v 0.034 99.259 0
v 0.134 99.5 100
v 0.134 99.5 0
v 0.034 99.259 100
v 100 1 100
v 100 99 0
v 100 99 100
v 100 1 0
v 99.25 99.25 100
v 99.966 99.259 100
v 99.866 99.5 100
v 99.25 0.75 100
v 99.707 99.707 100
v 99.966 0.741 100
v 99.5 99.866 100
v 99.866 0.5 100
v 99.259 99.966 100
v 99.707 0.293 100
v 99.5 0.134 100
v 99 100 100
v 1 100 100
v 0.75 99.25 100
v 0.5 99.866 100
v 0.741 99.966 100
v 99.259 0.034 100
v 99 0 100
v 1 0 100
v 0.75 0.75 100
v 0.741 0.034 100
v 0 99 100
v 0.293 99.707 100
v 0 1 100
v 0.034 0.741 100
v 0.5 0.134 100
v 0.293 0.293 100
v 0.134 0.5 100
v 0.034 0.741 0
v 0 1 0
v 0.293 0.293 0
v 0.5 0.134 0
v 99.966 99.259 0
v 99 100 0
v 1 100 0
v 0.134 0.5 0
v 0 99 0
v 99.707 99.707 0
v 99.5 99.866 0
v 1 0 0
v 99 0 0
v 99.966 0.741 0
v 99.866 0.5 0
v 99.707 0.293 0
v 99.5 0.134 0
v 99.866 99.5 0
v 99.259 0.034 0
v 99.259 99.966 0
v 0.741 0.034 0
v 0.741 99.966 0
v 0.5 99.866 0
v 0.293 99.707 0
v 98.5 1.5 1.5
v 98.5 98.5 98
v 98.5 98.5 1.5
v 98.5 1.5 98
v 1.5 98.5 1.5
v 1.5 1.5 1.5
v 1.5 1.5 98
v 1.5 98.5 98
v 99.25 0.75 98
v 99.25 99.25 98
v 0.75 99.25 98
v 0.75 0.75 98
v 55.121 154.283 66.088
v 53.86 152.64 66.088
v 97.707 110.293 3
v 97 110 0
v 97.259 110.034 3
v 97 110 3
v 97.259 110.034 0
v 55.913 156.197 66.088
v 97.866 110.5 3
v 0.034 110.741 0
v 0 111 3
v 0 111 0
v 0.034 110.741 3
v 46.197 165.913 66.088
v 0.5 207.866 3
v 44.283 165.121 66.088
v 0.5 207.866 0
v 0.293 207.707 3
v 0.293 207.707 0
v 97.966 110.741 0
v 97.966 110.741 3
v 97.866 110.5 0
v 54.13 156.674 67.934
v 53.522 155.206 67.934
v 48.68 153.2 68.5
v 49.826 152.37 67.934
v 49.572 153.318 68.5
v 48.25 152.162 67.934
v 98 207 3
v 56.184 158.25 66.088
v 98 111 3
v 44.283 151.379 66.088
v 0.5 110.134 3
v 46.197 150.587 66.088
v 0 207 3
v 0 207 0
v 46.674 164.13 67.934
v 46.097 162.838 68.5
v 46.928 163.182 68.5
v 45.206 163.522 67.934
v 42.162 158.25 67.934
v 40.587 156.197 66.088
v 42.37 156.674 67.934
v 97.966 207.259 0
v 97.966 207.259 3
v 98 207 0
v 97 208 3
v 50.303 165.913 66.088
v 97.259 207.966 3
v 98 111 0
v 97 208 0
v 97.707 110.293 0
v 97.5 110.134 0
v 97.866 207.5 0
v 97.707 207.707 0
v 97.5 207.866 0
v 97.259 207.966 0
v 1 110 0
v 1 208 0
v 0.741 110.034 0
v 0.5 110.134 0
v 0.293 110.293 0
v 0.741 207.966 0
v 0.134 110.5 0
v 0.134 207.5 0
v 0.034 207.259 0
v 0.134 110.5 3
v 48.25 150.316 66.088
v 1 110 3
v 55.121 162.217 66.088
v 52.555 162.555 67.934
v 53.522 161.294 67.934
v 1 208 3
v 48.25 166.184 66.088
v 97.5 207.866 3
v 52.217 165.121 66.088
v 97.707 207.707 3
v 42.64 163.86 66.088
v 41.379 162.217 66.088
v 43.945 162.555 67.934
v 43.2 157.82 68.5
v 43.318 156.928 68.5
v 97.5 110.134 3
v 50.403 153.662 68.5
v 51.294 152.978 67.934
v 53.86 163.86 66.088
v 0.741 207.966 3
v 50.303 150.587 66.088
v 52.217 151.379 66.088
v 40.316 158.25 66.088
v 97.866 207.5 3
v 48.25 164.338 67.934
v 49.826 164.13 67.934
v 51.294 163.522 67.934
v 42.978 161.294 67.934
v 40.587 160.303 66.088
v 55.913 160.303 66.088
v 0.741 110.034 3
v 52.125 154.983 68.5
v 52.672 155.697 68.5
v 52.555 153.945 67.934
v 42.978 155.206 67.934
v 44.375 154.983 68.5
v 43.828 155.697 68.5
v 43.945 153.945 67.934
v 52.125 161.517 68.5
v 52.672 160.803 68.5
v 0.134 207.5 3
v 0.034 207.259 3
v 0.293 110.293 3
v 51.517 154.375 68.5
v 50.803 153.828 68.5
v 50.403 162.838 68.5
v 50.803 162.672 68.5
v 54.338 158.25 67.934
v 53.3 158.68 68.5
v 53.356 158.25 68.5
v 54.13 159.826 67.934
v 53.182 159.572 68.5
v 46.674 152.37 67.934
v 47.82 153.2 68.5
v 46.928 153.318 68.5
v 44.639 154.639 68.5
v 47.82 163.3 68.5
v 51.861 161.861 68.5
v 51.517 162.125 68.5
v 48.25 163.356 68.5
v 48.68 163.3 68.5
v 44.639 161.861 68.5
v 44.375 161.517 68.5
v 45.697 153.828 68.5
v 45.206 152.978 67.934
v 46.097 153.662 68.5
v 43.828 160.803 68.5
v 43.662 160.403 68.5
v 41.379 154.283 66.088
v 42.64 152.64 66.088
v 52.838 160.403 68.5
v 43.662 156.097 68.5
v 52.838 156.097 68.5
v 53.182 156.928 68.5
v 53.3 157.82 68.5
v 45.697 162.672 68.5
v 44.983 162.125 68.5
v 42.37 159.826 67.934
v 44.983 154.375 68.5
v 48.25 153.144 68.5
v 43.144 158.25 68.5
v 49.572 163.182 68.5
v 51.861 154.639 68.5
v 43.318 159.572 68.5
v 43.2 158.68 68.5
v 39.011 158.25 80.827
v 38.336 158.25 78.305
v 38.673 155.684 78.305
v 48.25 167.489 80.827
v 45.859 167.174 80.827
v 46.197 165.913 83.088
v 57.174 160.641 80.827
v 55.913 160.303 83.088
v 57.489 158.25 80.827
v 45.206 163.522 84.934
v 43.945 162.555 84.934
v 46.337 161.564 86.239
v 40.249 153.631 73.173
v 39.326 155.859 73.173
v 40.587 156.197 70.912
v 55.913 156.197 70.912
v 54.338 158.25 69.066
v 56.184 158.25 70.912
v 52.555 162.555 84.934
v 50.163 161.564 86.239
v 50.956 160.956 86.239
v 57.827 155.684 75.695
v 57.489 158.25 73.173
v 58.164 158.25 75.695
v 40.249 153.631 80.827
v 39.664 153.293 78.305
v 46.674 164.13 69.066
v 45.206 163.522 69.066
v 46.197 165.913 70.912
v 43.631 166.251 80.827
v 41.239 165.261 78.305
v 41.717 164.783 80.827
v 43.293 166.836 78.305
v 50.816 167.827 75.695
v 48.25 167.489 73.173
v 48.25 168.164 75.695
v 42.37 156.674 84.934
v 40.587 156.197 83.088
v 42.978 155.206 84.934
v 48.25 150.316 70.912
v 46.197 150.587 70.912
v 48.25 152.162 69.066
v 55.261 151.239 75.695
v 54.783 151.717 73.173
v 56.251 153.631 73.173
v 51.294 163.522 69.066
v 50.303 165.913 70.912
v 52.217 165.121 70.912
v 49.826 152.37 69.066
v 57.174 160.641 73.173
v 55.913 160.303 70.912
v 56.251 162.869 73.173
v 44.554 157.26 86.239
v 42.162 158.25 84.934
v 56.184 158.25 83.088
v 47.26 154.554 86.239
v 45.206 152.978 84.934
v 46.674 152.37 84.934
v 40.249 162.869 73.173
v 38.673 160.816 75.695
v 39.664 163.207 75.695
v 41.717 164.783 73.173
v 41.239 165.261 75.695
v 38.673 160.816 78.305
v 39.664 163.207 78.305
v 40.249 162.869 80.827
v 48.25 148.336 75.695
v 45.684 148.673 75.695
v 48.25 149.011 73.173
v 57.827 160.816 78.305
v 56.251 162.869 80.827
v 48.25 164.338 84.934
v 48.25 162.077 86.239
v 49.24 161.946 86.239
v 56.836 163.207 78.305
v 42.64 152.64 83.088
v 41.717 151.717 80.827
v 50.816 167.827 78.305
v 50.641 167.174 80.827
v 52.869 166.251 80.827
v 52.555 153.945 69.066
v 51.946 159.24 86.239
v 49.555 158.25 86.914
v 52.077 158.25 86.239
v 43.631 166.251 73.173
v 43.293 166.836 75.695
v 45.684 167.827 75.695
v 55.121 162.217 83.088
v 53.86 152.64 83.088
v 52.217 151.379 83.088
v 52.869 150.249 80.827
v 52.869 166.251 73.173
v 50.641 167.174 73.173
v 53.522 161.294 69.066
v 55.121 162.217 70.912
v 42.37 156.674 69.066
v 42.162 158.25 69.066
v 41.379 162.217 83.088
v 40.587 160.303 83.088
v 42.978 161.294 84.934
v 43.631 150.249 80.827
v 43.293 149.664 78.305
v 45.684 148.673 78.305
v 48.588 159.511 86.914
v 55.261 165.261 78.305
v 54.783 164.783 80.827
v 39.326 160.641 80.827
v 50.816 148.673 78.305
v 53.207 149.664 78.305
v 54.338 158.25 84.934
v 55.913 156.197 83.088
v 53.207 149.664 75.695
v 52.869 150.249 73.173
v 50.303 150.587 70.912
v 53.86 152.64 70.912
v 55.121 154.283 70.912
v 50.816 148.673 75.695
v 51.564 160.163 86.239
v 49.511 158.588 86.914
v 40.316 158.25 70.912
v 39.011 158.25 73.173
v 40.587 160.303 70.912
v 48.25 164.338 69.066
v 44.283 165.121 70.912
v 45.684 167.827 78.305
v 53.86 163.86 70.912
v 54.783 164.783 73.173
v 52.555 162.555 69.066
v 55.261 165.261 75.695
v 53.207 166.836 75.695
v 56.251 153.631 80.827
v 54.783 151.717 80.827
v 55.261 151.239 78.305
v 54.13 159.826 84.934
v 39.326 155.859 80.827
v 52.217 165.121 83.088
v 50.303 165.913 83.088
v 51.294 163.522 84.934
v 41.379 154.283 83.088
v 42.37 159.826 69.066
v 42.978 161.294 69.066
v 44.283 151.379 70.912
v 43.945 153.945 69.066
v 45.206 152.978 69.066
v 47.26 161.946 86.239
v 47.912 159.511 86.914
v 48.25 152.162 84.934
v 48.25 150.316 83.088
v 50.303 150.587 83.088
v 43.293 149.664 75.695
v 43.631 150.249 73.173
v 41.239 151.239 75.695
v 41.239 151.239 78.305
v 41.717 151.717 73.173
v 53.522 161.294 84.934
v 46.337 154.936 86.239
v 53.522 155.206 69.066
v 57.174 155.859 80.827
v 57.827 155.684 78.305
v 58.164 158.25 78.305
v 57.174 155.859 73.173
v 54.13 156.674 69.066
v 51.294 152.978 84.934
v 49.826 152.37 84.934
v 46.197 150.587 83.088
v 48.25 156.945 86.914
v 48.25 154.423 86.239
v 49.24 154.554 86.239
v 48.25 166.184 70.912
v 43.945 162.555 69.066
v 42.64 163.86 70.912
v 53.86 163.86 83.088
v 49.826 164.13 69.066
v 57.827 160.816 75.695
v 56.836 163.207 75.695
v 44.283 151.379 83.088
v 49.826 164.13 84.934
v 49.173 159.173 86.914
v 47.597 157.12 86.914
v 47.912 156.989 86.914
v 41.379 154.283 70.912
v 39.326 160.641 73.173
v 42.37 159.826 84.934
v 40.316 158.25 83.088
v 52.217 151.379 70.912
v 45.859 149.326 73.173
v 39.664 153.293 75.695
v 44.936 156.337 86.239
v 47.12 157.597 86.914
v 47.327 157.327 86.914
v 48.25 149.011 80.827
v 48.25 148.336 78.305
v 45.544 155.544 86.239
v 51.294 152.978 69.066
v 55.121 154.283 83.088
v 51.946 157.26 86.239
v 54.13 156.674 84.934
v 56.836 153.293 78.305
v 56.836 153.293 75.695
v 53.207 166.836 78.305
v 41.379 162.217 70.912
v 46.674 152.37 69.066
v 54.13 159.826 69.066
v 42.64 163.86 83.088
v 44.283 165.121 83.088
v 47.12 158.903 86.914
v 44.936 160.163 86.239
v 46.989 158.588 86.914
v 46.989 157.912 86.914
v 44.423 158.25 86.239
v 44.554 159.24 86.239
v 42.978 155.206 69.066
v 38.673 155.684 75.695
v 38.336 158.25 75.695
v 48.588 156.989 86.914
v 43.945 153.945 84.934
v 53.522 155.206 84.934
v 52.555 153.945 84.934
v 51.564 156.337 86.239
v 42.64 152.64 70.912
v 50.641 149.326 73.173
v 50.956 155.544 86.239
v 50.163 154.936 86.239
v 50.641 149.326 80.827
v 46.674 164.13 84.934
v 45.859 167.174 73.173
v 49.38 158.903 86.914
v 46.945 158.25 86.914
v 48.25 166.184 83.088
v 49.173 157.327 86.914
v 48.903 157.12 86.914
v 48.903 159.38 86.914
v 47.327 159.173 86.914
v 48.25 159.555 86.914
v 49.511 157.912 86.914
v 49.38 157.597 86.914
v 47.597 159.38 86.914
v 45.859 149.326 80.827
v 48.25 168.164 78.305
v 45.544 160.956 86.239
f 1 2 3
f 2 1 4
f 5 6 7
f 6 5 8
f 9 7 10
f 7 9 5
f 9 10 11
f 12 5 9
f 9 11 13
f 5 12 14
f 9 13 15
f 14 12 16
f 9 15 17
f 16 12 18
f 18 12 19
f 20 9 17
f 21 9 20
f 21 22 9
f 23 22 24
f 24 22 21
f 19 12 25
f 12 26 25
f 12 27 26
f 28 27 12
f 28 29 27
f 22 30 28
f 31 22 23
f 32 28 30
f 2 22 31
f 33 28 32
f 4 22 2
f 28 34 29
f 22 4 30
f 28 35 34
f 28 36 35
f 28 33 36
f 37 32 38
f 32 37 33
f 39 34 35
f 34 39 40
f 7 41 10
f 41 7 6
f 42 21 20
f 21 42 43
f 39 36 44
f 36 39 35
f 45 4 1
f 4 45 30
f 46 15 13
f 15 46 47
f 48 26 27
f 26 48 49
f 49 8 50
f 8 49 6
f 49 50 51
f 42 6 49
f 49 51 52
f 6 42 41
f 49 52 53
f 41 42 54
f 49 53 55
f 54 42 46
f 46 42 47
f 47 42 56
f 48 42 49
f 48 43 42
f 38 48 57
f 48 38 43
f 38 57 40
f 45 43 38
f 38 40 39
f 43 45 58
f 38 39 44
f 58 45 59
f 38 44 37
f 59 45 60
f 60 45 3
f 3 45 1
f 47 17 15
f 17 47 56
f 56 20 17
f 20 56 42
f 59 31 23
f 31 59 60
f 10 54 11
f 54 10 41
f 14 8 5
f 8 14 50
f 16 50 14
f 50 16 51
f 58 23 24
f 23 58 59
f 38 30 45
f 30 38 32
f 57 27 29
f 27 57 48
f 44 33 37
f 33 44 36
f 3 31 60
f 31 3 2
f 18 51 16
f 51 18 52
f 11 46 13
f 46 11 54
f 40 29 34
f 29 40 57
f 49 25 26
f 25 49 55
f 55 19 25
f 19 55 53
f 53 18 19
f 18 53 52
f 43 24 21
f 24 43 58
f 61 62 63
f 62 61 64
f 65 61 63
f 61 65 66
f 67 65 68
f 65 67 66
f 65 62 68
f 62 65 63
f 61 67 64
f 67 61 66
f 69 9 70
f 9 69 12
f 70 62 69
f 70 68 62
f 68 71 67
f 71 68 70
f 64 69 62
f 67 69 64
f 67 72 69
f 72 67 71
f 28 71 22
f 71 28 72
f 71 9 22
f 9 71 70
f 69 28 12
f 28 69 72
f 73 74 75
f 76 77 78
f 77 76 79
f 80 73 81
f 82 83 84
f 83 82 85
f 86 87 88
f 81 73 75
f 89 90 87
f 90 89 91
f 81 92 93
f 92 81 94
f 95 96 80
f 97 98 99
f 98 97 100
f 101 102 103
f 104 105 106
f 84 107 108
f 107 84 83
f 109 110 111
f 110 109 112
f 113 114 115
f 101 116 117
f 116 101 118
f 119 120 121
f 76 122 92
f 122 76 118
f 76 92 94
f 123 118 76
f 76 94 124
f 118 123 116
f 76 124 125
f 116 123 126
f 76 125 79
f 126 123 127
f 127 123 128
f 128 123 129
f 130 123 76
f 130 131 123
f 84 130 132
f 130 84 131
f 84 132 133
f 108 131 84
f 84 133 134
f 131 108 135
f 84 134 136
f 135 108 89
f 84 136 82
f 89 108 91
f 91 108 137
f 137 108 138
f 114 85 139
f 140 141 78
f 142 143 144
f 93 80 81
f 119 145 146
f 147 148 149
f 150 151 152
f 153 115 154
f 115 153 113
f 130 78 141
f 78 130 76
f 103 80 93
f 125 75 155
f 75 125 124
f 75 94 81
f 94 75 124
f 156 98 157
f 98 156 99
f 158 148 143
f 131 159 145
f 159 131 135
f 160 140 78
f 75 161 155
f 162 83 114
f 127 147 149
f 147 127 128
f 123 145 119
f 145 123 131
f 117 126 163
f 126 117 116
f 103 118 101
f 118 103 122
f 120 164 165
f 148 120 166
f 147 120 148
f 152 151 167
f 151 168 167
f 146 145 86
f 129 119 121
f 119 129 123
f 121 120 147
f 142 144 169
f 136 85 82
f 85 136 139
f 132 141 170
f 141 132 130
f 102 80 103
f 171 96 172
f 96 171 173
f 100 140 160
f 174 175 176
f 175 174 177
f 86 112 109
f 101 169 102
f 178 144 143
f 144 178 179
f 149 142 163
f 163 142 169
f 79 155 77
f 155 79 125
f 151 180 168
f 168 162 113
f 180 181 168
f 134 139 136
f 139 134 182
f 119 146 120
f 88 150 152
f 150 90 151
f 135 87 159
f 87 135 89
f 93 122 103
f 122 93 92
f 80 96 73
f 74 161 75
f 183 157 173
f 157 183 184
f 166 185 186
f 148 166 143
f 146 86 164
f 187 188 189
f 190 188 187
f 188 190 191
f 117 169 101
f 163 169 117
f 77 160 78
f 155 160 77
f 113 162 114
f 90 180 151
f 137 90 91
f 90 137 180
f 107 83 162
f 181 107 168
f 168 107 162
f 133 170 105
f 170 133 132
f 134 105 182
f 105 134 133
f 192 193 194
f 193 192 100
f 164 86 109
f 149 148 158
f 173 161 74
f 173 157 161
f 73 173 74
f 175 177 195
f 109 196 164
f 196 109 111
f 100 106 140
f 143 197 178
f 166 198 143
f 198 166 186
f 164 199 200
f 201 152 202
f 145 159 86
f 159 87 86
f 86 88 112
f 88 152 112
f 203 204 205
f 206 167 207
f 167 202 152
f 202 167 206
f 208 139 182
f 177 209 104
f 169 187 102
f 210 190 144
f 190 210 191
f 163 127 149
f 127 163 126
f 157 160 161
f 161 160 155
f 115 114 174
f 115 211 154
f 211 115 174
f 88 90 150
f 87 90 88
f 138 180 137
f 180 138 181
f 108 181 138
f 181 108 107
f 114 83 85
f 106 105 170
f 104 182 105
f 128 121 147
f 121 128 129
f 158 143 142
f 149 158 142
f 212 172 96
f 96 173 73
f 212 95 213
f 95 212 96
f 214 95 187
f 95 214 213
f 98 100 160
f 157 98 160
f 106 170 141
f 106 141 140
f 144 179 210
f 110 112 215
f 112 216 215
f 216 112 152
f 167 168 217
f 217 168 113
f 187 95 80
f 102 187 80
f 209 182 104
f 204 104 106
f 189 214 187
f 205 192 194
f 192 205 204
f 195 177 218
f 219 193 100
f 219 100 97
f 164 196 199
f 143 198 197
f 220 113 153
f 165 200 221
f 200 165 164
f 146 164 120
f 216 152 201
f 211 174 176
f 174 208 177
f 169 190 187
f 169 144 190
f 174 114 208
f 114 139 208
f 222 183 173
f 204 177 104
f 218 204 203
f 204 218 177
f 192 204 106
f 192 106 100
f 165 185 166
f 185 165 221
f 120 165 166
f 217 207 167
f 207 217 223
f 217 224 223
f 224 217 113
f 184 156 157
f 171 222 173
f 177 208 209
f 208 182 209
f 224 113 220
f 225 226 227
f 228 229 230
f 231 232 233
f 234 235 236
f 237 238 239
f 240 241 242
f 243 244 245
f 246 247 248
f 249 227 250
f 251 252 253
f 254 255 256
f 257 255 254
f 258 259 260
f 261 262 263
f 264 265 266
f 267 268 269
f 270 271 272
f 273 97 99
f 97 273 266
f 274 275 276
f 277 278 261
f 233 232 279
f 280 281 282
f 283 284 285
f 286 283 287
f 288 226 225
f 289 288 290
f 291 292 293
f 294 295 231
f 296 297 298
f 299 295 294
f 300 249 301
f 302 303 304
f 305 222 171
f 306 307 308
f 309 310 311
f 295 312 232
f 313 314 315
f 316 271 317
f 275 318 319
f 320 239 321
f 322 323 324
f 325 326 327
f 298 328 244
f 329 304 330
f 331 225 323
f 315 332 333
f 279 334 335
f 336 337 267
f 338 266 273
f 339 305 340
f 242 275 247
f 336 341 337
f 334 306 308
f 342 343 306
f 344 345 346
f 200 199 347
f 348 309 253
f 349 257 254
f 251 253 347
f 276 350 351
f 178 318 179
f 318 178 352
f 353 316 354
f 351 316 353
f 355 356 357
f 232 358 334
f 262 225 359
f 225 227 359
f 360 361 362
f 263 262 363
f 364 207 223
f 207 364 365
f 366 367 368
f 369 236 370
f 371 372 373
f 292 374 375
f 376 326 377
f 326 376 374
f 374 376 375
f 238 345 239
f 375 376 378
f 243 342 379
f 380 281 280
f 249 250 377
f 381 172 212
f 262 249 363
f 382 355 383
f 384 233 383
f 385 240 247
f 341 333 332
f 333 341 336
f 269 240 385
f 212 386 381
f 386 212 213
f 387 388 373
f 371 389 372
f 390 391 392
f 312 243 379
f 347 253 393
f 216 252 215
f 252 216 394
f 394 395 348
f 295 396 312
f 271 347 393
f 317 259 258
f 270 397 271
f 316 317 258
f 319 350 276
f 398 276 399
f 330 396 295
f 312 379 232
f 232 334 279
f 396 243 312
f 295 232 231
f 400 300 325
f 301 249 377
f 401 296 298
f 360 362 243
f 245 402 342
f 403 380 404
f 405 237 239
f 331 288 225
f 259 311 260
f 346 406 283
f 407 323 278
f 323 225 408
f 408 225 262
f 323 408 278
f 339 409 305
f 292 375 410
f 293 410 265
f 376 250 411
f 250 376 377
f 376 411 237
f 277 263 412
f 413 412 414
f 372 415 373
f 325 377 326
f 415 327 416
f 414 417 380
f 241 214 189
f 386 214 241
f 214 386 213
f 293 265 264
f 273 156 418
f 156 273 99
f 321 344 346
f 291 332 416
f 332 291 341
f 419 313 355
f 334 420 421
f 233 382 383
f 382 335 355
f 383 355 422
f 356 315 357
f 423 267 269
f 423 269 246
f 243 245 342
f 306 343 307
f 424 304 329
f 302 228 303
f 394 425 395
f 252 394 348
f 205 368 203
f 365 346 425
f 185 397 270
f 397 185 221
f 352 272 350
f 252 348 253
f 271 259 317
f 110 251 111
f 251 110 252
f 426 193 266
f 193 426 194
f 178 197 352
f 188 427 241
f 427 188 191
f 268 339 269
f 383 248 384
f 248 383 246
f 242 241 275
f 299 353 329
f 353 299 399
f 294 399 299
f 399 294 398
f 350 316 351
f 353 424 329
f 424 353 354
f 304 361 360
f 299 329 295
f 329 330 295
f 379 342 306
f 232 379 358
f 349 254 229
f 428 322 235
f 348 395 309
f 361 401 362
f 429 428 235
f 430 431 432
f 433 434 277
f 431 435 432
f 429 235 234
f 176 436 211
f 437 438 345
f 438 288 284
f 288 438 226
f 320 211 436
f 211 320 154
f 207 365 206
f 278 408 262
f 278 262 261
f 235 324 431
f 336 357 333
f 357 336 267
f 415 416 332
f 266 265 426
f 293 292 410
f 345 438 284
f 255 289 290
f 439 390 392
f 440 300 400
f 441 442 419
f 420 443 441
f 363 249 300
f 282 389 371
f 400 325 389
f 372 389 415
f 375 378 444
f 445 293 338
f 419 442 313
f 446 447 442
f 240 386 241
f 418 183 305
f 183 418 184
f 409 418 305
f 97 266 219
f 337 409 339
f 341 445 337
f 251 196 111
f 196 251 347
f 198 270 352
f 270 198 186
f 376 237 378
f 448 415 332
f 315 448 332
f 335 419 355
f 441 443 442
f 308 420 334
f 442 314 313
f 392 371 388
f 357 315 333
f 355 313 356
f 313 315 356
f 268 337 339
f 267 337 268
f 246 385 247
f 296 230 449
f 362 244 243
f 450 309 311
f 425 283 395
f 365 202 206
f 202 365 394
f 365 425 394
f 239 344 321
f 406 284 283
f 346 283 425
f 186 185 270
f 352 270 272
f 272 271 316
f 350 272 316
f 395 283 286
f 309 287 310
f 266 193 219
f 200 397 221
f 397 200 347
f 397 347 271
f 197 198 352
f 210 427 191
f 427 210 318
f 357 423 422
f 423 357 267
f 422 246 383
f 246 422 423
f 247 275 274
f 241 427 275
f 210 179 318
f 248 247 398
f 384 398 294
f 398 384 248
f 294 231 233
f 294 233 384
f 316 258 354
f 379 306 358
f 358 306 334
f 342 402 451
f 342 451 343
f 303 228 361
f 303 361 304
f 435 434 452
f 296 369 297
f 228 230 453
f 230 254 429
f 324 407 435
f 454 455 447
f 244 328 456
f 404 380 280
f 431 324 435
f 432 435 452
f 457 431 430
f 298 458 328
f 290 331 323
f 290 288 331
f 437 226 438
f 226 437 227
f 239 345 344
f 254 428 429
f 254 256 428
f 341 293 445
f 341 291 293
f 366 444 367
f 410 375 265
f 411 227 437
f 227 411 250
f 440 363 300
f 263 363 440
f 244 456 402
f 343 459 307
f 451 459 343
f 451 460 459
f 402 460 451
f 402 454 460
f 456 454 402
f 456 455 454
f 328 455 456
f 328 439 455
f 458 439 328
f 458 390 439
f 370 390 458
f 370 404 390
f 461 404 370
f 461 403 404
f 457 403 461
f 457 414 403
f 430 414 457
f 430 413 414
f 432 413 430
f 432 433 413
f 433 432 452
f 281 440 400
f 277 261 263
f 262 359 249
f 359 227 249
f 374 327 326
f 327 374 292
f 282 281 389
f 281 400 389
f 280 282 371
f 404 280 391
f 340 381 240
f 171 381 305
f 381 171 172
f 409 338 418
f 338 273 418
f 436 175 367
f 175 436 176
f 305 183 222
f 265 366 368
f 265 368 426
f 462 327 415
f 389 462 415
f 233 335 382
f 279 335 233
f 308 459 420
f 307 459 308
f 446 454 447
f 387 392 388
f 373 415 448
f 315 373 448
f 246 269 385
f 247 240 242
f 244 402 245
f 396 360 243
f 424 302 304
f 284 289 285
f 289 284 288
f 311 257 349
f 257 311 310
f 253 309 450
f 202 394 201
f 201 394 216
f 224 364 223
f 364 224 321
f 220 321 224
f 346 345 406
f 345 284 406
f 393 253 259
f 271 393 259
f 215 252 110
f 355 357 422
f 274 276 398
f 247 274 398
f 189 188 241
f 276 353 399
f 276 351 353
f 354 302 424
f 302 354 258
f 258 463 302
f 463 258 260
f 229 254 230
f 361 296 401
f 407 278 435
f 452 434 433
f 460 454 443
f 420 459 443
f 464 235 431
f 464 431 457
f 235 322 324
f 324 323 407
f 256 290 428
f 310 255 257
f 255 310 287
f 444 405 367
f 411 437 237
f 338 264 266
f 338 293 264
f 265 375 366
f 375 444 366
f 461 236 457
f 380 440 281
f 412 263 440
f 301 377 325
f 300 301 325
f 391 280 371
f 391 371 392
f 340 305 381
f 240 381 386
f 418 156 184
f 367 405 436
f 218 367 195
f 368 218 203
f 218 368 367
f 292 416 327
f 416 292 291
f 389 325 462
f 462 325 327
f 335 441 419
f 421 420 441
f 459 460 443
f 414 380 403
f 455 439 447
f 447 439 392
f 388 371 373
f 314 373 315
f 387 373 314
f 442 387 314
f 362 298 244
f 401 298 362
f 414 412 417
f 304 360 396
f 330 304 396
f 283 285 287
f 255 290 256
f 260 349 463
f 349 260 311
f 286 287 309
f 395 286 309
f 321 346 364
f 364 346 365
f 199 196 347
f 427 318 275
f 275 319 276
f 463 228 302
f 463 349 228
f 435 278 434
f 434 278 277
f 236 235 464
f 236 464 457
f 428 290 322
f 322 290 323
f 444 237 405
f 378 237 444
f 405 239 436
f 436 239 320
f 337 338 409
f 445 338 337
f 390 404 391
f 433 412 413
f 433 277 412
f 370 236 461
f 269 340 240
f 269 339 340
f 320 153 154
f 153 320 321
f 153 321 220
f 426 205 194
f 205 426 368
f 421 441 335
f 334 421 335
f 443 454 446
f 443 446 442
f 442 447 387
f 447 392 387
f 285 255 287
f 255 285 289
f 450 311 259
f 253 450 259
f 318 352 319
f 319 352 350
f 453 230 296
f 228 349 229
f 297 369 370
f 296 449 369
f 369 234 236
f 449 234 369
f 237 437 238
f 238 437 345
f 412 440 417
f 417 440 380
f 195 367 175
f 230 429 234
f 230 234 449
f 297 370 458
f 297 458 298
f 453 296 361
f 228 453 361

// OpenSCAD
figure = "sphere";      //[sphere,cube,pyramide,triangles,pyramide2,diamond,pyramide3]
//Secret compartment
Secret = "false";   //[true,false]
//Cover
Cover = "true";     //[true,false]
//Box length
long_boit = 100;
//Box width
larg_boit = 100;
//Box height
haut_boit = 100;




module toto() {
}

$fn = 24;


haut_bo_s = haut_boit/2;
ray_sph = long_boit/10;
ray1_cyl = larg_boit/5.5;
ray2_cyl = 0;
haut_cyl = haut_boit/3;
cote_cub = long_boit/6;
ray_cyl_t = ray_sph;
haut_cyl_t = ray_cyl_t;
haut_t = ray_sph*2;
cot_tr = cote_cub*1.5;


teta = 2;
ep_bort = 1.5;
ep_bort_s = 2.25;
ep_fond = 1.5;
sec_haut = 5;
sec = 2;
haut_couv_av_hul = 2;   //hauteur du couvercle avant que l'on fasse le hull
haut_bord = haut_couv_av_hul;
long_boit_int = long_boit - ep_bort*teta;
larg_boit_int = larg_boit - ep_bort*teta;
haut_boit_int = haut_boit - ep_fond;
haut_couv = haut_boit/teta;
ray_cyl_mink = 1;
haut_cyl_mink = 1;
tolerance=0.5;


boite();
if(Secret == "false") {
    translate([0,larg_boit+10,0])
    if(Cover == "true") {
        couvercle();
    }
}
if(Secret == "true") {
    if(Cover == "true") {
        translate([0,larg_boit*2+10*2,0])
        couvercle();
    }
}




module boite() {
    if(Secret == "true") {
        translate([0,larg_boit+10,0]){
            union() {
                difference() {
                translate ([ray_cyl_mink, ray_cyl_mink, 0])
                    minkowski() {
                        cube([long_boit-2*ray_cyl_mink, larg_boit-2*ray_cyl_mink, haut_boit-haut_cyl_mink]);
                        cylinder(r = ray_cyl_mink, h = haut_cyl_mink);
                    }
                    translate([ep_bort_s/3*2, ep_bort_s/3*2, ep_fond])
                        cube([long_boit-ep_bort_s/3*2*2, larg_boit-ep_bort_s/3*2*2, haut_boit_int + sec_haut]);
        //            translate([ep_bort/teta,ep_bort/teta,haut_boit-haut_bord])
        	//			cube([long_boit-ep_bort, larg_boit-ep_bort, haut_bord + sec]);
                    translate([ep_bort_s/3,ep_bort_s/3,haut_bo_s-haut_couv_av_hul])
                    cube([long_boit-ep_bort_s/3*2,larg_boit-ep_bort_s/3*2,haut_boit]);
                }
            }
        }
                        difference() {
                    cube([long_boit_int+ep_bort_s/3,larg_boit_int+ep_bort_s/3,haut_boit_int-haut_bo_s]);
                    translate([ep_bort_s/2,ep_bort_s/2,ep_fond])
                    cube([long_boit_int-ep_bort_s/3*2,larg_boit_int-ep_bort_s/3*2,haut_boit_int]);
            }
        }
                    
                    
    if(Secret == "false") {        
        union() {
            difference() {
                translate ([ray_cyl_mink, ray_cyl_mink, 0])
                    minkowski() {
                        cube([long_boit-2*ray_cyl_mink, larg_boit-2*ray_cyl_mink, haut_boit-haut_cyl_mink]);
                        cylinder(r = ray_cyl_mink, h = haut_cyl_mink);
                    }
                    translate([ep_bort, ep_bort, ep_fond])
                        cube([long_boit_int, larg_boit_int, haut_boit_int + sec_haut]);
                    translate([ep_bort/teta,ep_bort/teta,haut_boit-haut_bord])
                        cube([long_boit-ep_bort, larg_boit-ep_bort, haut_bord + sec]);
                    
    
    
        
            }
        }
        
    }    

    }

module couvercle() {
    union () {
        hull() {
			translate ([ray_cyl_mink, ray_cyl_mink, 0])
				minkowski() {
					cube([long_boit - ep_bort - ray_cyl_mink*2 - tolerance, larg_boit - ep_bort - ray_cyl_mink*2 - tolerance, haut_couv_av_hul]);
					cylinder(r = ray_cyl_mink, h = haut_cyl_mink);
				}
            if(figure == "sphere")
                translate([long_boit/teta - ep_bort - tolerance/2,  larg_boit/teta - ep_bort - tolerance/2, haut_couv+ray_sph])
					sphere(r=ray_sph);
            if(figure == "cube")
                translate([long_boit/teta -cote_cub/teta - tolerance/2, larg_boit/teta -cote_cub/teta - tolerance/2, haut_couv])
					cube(cote_cub);
            if(figure == "pyramide")
                translate([long_boit/teta - ep_bort - tolerance/2,  larg_boit/teta - ep_bort - tolerance/2, haut_couv+ray_sph])
					sphere(r=ray_sph);
            if(figure == "triangles")
                translate([long_boit/teta - ep_bort - tolerance/2,  larg_boit/teta - ep_bort - tolerance/2, haut_couv+ray_sph])
					sphere(r=ray_sph);
            if(figure == "pyramide2")
                translate([long_boit/teta - ep_bort - tolerance/2,  larg_boit/teta - ep_bort - tolerance/2, haut_couv+ray_sph])
					sphere(r=ray_sph);
            if(figure == "diamond")
                translate([long_boit/teta - ep_bort - tolerance/2,  larg_boit/teta - ep_bort - tolerance/2, haut_couv+ray_sph])
					sphere(r=ray_sph);
            if(figure == "sphere2")
                translate([long_boit/teta - ep_bort - tolerance/2,  larg_boit/teta - ep_bort - tolerance/2, haut_couv+ray_sph])
					sphere(r=ray_sph);
            if(figure == "pyramide3")
                translate([long_boit/teta - ep_bort - tolerance/2,  larg_boit/teta - ep_bort - tolerance/2, haut_couv+ray_sph])
					sphere(r=ray_sph);
        
        
        }
            if(figure == "sphere")
                translate([long_boit/teta - ep_bort - tolerance/2,  larg_boit/teta - ep_bort - tolerance/2,  haut_couv+ray_sph*teta+ray_sph*0.7])
                sphere(r=ray_sph);
            if(figure == "cube")
                translate([long_boit/teta - tolerance/2, larg_boit/teta - tolerance/2, haut_couv+cote_cub*1.5])
                cube(cote_cub,center=true);
            if(figure == "pyramide")
                translate([long_boit/teta - ep_bort - tolerance/2,  larg_boit/teta - ep_bort - tolerance/2 ,haut_couv+haut_cyl+haut_cyl/1.2])
                rotate([180,0,0])
                cylinder(r1 = ray1_cyl, r2 = ray2_cyl, h = haut_cyl);
            if(figure == "triangles")
                translate([long_boit/2-haut_cyl_t*3.15,larg_boit/2-haut_cyl_t/1.2,0])
                union() {
                    translate([haut_t-ray_sph/6,0,haut_t+ray_cyl_t+haut_couv+ray_sph])    
                    couv_t();
    }
            if(figure == "pyramide2")
                translate([long_boit_int/2-cote_cub/2,larg_boit_int/2-cote_cub/2,haut_couv+ray_sph*2])
                rotate([0,180,0])
                translate([-cote_cub+ray_sph/16,-ray_sph/16,-haut_cyl+1])
                hull() {
                    cube([cote_cub,cote_cub,1]);
                    translate([cote_cub/2-0.5,cote_cub/2-0.5,haut_cyl])
                    cube([1,1,1]);
                }
            if(figure == "diamond")
                translate([long_boit_int/2-cote_cub/2,larg_boit_int/2-cote_cub/2,haut_couv+ray_sph*2])
                rotate([0,180,0])
                translate([-cote_cub+ray_sph/16,-ray_sph/16,-haut_cyl+1])
                hull() {
                    cube([cote_cub,cote_cub,1]);
                    translate([cote_cub/2-0.5,cote_cub/2-0.5,haut_cyl])
                    cube([1,1,1]);
                    translate([cote_cub/2-0.5,cote_cub/2-0.5,-haut_cyl])
                    cube([1,1,1]);
                }
            if(figure == "pyramide3")
                translate([-cot_tr/2,-(sqrt(cot_tr*cot_tr-(cot_tr/2*cot_tr/2)))/3,0])
                translate([long_boit/2-ray_cyl_mink*2,larg_boit/2-ray_cyl_mink*2,haut_couv+ray_sph*2+cot_tr/1.5])
            mirror([0,0,1]){ 
                    tri_equ();
            }
            
}

}



module couv_t() {
    rotate([-90,0,0])
        hull () {
            translate([0,0,0]) 
                cylinder(r=ray_cyl_t,h=haut_cyl_t);
            translate([haut_t,0,0]) 
                cylinder(r=ray_cyl_t,h=haut_cyl_t);
            translate([haut_t/2,haut_t,0]) 
                cylinder(r=ray_cyl_t,h=haut_cyl_t);
    }
        translate([haut_cyl_t+ray_cyl_t/2,-ray_cyl_t/2,0])
        rotate([-90,0,90])
        hull () {
            translate([0,0,0]) 
                cylinder(r=ray_cyl_t,h=haut_cyl_t);
            translate([haut_t,0,0]) 
                cylinder(r=ray_cyl_t,h=haut_cyl_t);
            translate([haut_t/2,haut_t,0]) 
                cylinder(r=ray_cyl_t,h=haut_cyl_t);  
}
    }
      

module tri_equ() {
    polyhedron(points = [[0,0,0],[cot_tr,0,0],[cot_tr/2,sqrt(cot_tr*cot_tr-(cot_tr/2*cot_tr/2)),0],[cot_tr/2,(sqrt(cot_tr*cot_tr-(cot_tr/2*cot_tr/2)))/3,sqrt(cot_tr*cot_tr-(cot_tr/2*cot_tr/2))]],faces=[ [0,1,4],[1,2,4],[2,3,4],[3,0,4],[1,0,3],[2,1,3],[0,1,2],[0,2,3]]);
    
}
    
